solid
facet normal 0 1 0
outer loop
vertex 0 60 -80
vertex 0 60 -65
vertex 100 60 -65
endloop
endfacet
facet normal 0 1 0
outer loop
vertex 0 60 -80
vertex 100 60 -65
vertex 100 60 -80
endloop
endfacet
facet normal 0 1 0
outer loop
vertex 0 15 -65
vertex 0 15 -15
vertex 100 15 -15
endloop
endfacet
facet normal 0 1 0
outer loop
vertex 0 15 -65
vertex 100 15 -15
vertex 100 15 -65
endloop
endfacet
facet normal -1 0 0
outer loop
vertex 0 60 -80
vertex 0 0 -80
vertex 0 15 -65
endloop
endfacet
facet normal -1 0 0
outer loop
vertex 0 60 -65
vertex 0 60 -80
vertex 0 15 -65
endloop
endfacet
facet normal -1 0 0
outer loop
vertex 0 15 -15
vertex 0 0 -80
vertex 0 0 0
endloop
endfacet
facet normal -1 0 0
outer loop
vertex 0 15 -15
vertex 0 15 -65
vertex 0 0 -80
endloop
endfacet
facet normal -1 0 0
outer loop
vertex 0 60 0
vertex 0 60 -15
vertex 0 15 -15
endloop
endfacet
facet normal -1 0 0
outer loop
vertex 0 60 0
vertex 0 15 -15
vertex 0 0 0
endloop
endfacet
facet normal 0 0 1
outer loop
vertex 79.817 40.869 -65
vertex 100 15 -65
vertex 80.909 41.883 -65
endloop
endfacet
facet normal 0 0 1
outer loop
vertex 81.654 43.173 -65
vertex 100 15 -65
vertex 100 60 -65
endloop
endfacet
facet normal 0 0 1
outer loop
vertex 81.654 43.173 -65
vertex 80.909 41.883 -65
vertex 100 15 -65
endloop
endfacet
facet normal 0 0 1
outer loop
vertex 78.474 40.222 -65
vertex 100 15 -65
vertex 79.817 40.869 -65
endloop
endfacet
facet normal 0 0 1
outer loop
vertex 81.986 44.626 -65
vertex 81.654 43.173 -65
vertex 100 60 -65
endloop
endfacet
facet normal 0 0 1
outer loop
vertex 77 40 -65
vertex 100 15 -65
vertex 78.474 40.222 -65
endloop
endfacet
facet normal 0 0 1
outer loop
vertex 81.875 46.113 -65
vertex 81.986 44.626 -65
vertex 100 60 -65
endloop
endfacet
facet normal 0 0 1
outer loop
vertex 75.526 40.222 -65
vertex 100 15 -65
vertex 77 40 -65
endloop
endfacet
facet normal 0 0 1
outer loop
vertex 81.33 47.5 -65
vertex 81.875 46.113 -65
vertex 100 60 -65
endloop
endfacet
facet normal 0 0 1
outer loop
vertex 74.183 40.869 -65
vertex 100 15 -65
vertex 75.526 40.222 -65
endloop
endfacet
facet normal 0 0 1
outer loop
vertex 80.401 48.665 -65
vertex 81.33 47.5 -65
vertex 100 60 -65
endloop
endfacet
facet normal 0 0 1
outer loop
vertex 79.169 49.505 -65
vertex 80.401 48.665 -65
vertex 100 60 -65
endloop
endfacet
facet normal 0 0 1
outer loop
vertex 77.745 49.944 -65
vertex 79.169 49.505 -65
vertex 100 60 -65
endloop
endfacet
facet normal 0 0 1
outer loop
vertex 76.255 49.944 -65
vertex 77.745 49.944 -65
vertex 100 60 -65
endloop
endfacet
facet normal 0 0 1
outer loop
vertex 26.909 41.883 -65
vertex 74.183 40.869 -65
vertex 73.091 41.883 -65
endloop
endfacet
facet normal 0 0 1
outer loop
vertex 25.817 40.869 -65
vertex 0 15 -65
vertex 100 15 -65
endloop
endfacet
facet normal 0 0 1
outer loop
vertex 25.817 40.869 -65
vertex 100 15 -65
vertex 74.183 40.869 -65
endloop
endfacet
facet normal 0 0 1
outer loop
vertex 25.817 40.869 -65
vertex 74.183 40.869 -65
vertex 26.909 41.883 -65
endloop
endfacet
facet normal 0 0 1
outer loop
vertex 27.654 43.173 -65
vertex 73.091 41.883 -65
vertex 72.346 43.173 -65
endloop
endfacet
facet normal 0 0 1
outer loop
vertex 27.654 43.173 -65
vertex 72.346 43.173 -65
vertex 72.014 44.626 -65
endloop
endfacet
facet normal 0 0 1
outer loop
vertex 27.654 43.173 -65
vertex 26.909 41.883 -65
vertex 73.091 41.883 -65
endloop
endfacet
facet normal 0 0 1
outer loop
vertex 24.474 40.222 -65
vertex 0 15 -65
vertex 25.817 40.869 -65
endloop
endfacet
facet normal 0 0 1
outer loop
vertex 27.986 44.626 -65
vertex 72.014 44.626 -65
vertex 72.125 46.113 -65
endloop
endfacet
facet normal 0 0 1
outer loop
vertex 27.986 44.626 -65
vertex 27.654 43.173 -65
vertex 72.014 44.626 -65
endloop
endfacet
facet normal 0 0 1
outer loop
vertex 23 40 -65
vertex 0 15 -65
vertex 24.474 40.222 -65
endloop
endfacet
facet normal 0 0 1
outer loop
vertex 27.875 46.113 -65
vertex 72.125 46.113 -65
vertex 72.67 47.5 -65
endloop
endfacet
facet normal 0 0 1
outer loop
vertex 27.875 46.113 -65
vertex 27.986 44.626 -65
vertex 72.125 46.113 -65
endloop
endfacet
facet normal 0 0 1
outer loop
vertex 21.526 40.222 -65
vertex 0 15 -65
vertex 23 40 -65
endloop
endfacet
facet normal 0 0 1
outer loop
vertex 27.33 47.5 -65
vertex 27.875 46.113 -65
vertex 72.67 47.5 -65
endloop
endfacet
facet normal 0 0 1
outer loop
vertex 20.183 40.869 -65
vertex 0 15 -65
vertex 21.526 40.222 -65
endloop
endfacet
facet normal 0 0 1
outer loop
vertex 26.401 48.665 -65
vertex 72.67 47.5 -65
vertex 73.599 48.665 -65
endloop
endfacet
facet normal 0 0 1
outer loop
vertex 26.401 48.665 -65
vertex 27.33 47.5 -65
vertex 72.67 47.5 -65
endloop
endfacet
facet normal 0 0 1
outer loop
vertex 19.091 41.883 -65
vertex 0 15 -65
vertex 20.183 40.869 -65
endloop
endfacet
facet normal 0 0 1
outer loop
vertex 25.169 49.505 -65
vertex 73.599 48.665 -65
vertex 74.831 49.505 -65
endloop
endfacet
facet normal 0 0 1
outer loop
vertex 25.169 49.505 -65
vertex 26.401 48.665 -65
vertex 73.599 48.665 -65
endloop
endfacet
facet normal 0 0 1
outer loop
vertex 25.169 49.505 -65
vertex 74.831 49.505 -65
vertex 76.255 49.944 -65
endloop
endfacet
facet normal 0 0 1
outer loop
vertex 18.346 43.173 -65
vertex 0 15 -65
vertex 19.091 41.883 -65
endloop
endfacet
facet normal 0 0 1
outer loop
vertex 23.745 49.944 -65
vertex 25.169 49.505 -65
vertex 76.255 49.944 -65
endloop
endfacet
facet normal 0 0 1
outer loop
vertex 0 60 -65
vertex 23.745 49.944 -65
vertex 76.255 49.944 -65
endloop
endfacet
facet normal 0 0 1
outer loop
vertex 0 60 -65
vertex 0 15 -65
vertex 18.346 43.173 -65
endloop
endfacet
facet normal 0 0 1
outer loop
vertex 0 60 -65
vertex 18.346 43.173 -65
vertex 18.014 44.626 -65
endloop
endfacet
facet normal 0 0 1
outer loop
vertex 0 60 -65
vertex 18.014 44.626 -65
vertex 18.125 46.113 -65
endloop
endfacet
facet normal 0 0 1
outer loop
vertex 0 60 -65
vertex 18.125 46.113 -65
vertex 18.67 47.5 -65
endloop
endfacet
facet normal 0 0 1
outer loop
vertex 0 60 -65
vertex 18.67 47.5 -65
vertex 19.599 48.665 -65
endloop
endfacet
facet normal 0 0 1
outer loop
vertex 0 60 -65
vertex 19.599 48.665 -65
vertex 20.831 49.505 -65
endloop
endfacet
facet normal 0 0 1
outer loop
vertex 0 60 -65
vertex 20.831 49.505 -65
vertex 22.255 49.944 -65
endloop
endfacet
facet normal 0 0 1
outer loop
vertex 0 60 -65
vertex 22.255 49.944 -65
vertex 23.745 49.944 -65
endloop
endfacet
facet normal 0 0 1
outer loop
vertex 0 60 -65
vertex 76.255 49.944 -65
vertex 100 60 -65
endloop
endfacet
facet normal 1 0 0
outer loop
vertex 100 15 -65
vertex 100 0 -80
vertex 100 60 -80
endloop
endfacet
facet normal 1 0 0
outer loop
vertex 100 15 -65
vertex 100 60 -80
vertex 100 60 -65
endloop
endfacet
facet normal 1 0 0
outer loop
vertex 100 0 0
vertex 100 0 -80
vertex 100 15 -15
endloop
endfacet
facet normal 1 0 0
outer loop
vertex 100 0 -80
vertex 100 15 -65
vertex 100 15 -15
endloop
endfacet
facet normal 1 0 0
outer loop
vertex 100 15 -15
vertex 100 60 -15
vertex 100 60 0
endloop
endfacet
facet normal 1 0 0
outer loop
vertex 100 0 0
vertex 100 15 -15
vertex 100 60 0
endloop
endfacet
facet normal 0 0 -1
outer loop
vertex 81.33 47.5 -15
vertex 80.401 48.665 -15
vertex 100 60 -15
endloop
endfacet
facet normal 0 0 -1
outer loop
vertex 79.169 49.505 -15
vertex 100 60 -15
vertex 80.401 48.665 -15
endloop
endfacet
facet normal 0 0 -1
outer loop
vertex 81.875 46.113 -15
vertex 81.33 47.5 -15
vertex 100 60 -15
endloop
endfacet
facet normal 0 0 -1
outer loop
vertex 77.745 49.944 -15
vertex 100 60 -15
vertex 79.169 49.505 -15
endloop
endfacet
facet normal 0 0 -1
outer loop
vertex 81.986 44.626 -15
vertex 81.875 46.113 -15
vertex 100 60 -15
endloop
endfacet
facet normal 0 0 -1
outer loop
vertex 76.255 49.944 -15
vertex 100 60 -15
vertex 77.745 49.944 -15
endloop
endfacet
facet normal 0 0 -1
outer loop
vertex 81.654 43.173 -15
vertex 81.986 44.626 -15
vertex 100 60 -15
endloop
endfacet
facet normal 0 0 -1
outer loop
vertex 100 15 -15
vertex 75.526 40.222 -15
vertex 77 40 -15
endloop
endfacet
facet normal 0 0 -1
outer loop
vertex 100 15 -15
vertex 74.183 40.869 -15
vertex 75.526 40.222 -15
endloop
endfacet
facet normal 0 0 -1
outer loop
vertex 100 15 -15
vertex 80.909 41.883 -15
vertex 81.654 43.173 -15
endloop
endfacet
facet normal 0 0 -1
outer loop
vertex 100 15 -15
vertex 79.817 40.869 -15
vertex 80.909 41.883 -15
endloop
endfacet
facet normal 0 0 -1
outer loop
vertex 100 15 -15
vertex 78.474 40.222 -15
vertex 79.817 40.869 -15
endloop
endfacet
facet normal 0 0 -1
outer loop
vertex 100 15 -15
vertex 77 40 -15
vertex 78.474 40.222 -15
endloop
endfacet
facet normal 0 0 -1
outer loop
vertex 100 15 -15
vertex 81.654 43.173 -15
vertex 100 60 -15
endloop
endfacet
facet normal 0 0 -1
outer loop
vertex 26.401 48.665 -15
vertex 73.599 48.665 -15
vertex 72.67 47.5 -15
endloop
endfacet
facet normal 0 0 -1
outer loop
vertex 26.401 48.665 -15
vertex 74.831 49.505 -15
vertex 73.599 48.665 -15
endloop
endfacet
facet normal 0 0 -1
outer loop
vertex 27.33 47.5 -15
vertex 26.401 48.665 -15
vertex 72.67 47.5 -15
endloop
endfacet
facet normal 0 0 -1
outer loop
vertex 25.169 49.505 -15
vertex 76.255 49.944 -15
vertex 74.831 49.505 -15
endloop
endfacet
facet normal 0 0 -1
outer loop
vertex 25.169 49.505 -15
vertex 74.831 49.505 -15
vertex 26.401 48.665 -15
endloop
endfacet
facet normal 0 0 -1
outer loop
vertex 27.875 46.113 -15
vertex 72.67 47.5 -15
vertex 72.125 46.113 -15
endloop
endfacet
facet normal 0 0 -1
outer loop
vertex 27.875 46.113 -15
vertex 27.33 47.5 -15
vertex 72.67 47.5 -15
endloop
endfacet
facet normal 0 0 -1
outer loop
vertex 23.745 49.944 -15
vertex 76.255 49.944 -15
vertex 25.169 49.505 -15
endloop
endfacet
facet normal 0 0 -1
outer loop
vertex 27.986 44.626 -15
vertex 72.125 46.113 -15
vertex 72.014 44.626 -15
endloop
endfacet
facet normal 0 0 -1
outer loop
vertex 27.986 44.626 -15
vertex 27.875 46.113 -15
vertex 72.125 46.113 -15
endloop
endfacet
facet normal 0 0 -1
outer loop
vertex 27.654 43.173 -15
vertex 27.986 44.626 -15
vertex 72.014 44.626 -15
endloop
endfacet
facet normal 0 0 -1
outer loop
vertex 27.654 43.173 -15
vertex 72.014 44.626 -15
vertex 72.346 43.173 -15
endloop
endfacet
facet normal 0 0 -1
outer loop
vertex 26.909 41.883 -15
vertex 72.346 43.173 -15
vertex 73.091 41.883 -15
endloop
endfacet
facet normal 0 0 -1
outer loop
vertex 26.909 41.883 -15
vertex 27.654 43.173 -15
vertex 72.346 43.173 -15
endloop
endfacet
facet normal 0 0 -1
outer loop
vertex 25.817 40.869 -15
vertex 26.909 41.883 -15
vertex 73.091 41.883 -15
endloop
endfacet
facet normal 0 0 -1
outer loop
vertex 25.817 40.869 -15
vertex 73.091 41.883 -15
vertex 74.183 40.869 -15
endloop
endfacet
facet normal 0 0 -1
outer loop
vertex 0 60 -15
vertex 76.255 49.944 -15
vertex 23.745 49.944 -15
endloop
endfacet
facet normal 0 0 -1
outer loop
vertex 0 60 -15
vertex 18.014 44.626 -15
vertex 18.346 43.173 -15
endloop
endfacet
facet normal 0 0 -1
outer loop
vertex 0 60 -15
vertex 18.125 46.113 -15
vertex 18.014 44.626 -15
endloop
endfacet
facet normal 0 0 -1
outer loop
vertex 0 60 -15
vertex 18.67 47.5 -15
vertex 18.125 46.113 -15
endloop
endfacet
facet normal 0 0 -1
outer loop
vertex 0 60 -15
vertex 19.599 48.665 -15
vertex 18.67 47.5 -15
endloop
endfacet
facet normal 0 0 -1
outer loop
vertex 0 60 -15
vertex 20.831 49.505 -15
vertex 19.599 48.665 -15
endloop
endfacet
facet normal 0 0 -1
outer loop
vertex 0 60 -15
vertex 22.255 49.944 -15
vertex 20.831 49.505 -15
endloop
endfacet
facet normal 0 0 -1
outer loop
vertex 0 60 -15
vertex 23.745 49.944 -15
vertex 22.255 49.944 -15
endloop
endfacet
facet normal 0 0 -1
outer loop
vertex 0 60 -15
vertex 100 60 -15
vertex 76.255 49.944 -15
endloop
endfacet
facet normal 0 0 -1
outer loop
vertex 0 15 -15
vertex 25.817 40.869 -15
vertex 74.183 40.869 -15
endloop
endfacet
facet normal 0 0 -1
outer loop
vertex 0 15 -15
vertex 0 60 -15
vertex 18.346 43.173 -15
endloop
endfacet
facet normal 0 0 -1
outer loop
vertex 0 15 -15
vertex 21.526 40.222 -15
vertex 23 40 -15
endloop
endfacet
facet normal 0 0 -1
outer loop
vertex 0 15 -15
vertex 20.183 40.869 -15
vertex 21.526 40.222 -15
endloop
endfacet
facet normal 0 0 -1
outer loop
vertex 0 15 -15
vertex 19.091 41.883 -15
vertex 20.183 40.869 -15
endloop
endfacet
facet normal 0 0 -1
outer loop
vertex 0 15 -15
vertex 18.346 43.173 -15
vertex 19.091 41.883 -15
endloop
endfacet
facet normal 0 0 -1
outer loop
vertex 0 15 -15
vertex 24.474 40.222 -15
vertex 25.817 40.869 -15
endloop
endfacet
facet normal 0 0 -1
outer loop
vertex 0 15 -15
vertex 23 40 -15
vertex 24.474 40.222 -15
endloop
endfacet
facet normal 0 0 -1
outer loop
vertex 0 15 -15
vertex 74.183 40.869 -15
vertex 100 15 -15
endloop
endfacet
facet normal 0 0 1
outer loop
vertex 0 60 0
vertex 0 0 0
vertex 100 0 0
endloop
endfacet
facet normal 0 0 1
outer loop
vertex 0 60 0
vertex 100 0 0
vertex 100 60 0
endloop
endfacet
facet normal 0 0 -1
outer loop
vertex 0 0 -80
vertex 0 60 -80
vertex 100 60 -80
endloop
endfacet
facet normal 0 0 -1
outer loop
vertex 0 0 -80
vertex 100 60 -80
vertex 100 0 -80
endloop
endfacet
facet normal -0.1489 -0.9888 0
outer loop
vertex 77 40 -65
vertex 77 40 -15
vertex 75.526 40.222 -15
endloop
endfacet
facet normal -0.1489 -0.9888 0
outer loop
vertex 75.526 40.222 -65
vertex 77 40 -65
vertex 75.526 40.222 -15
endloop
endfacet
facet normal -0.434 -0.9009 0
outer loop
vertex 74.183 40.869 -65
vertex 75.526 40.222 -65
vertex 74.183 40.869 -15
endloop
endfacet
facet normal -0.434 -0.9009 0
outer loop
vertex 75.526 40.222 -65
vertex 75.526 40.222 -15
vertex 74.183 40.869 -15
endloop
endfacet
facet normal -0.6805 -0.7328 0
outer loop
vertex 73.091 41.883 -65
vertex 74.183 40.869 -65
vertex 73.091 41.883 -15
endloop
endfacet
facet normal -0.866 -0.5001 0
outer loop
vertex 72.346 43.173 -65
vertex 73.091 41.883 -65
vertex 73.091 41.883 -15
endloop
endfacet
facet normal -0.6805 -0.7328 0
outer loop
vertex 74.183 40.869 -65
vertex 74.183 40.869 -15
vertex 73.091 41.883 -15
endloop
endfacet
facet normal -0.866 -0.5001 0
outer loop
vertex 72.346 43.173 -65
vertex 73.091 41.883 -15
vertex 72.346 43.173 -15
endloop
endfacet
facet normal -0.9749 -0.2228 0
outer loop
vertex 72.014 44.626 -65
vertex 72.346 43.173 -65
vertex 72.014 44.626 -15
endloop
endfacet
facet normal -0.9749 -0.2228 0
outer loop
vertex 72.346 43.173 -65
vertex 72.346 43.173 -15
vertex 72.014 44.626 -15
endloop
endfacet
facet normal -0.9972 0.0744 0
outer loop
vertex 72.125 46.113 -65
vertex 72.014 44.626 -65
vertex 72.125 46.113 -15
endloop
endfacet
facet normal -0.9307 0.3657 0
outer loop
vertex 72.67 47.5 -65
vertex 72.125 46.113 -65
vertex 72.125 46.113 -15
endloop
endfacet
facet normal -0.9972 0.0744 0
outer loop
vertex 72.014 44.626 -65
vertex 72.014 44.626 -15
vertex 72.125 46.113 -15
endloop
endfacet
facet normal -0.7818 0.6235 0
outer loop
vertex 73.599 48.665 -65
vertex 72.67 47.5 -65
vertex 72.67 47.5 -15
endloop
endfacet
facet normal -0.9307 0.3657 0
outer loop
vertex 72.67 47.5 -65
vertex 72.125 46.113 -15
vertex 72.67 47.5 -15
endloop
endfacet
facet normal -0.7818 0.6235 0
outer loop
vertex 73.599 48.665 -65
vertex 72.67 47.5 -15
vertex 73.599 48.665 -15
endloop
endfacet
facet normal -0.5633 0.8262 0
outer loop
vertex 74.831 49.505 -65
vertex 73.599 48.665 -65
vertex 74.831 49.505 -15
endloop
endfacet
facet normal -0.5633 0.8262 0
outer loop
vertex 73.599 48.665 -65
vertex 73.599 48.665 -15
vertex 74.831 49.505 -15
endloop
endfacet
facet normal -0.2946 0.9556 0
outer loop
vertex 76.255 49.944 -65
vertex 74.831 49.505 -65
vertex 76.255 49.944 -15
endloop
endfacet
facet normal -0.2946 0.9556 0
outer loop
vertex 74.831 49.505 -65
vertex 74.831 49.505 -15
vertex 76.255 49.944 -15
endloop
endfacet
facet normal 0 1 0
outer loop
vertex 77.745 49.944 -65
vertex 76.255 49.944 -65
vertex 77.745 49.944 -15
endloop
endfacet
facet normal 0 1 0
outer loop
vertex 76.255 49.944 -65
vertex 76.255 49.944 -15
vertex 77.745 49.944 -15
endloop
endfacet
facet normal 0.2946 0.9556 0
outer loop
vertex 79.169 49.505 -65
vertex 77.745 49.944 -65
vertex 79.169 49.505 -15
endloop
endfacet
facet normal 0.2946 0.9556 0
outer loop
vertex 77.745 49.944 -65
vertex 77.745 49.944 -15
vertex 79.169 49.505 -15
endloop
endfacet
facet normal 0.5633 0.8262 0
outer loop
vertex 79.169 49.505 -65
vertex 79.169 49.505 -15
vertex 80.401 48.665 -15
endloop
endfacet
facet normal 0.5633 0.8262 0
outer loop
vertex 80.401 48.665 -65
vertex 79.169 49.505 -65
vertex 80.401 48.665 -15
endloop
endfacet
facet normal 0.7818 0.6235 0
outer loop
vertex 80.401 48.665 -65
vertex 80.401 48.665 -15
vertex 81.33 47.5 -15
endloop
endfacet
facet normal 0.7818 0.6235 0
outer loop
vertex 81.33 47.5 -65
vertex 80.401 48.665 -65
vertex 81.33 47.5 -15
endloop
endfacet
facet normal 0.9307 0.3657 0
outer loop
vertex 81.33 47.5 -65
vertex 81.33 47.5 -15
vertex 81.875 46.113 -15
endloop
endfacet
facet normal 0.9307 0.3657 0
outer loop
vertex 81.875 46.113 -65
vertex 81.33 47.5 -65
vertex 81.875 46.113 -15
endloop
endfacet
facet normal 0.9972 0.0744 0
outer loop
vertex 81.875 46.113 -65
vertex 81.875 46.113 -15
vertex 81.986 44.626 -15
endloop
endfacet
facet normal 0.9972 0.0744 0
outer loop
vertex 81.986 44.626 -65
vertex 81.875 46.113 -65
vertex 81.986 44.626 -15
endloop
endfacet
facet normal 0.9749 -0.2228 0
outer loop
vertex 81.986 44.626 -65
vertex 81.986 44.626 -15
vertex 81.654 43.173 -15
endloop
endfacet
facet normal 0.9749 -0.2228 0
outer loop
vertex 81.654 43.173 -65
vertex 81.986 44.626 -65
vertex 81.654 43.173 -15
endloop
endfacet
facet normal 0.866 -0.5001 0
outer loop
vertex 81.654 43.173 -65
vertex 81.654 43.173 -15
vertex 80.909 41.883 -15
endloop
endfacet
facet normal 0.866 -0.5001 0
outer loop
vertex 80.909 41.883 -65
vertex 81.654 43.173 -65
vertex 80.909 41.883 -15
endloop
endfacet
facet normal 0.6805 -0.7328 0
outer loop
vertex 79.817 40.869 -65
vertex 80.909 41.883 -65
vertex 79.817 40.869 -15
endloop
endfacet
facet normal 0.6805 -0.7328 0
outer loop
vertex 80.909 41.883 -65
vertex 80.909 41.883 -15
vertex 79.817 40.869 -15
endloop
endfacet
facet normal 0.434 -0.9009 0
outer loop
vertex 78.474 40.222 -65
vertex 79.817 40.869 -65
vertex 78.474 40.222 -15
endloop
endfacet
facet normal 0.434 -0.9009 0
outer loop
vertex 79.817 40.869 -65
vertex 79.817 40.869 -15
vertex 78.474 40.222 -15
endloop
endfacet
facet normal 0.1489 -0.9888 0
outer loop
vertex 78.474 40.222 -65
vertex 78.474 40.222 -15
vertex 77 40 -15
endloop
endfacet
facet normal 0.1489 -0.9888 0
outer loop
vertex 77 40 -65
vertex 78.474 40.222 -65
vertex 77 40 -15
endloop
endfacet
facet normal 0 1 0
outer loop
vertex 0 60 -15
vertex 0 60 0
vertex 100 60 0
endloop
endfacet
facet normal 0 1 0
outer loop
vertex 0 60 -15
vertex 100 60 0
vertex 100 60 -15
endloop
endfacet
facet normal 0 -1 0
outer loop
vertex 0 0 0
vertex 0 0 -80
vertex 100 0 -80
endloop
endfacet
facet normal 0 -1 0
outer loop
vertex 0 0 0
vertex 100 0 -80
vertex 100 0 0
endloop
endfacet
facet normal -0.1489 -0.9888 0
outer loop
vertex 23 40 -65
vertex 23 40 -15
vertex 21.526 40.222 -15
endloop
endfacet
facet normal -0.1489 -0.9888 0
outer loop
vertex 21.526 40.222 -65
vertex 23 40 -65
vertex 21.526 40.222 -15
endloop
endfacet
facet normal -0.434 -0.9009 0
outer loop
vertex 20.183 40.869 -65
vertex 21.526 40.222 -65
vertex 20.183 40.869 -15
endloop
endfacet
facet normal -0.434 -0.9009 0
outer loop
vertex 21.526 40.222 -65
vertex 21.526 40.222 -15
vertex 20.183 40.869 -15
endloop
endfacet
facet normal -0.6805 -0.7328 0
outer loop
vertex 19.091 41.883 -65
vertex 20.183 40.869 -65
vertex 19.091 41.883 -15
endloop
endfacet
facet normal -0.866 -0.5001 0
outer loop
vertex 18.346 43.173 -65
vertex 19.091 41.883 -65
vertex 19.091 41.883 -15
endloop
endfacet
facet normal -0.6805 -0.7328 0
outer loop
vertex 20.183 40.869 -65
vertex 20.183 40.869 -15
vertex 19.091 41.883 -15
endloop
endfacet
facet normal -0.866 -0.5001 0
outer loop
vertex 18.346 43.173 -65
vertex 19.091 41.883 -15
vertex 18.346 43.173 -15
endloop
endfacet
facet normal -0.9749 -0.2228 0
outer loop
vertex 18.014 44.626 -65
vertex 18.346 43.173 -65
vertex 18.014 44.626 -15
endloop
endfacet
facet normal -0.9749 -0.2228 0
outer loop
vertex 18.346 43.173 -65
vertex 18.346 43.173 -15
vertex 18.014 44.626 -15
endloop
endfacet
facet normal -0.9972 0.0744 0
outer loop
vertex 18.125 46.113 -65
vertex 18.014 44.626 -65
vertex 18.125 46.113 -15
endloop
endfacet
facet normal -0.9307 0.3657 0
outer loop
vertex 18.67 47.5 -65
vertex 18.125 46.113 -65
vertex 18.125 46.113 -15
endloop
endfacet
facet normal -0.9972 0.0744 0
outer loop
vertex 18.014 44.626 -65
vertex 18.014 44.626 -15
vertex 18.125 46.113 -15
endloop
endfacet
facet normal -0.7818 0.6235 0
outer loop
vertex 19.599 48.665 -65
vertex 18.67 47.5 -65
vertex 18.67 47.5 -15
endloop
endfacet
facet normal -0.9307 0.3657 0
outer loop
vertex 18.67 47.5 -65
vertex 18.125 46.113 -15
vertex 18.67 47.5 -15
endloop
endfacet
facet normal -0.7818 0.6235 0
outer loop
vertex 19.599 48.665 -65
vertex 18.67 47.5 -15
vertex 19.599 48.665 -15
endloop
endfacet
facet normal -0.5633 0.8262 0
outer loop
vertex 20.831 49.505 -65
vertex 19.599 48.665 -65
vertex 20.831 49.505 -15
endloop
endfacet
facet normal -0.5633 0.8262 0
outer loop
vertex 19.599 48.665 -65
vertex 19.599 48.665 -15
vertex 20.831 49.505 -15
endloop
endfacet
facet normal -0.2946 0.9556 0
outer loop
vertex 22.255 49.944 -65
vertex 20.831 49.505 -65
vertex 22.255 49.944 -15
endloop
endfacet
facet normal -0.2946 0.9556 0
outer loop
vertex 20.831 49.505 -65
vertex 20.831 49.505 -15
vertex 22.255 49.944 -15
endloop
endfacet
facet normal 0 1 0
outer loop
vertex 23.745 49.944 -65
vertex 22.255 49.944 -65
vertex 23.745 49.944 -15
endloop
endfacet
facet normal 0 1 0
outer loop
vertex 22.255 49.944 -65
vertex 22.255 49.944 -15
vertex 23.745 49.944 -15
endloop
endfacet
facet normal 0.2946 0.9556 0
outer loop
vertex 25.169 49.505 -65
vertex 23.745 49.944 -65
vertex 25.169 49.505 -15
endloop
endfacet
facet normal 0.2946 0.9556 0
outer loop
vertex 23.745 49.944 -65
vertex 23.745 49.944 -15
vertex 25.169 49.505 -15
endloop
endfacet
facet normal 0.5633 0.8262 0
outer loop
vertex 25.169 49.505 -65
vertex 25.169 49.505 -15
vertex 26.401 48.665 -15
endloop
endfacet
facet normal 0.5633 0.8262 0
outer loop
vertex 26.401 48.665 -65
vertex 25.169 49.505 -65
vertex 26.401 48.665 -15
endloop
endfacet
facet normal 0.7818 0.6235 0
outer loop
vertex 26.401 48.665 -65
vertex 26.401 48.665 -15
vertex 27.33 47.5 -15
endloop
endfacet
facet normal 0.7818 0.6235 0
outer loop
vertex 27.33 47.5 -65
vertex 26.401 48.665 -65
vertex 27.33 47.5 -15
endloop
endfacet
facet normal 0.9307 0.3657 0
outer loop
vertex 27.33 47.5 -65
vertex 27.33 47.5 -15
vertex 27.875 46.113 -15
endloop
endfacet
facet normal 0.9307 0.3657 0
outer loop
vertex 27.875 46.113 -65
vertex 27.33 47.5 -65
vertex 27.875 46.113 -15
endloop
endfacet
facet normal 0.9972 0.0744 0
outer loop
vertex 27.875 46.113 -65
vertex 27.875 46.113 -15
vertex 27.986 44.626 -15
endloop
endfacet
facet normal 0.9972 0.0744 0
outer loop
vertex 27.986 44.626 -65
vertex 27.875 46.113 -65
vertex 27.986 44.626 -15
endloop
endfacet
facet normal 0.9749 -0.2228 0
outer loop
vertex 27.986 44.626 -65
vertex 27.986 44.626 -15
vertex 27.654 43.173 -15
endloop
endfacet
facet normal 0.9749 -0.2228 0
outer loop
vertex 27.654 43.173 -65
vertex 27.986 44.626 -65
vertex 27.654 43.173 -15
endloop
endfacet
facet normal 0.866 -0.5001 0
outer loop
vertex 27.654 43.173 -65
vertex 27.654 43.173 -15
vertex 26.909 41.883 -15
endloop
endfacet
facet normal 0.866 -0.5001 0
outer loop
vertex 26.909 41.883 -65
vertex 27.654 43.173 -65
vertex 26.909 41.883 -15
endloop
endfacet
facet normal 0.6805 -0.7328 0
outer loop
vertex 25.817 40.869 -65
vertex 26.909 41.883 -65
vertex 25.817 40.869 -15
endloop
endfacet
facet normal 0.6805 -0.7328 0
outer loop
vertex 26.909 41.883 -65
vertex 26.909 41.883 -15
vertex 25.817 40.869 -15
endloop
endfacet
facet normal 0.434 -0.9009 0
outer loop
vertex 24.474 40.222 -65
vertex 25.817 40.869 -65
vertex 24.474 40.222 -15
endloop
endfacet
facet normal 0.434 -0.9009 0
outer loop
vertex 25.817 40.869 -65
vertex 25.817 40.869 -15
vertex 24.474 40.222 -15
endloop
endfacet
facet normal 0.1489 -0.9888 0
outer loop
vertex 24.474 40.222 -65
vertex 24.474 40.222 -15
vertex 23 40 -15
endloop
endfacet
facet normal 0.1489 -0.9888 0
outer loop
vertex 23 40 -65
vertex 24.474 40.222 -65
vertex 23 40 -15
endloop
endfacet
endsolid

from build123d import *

# Parameters (mm, degrees)
BOSS_EXTRUDE1_DEPTH = 100
SKETCH2_R           = 5
BOSS_EXTRUDE2_DEPTH = 50


with BuildPart() as part:
    # Sketch1 → Boss-Extrude1 (new body)
    with BuildSketch(Plane(origin=(0, 0, 0), x_dir=(0, 0, -1), z_dir=(1, 0, 0))):
        Polygon((0, 0), (0, 60), (15, 60), (15, 15), (65, 15), (65, 60), (80, 60), (80, 0), align=None)
    extrude(amount=BOSS_EXTRUDE1_DEPTH)

    # Sketch2 → Boss-Extrude2 (add)
    with BuildSketch(Plane(origin=(0, 0, -15), x_dir=(-1, 0, 0), z_dir=(0, 0, -1))):
        with Locations(Location((-77, 45, 0), (0, 0, 270))):
            Circle(SKETCH2_R)
        with Locations(Location((-23, 45, 0), (0, 0, 270))):
            Circle(SKETCH2_R)
    extrude(amount=BOSS_EXTRUDE2_DEPTH)


solid = part.part
